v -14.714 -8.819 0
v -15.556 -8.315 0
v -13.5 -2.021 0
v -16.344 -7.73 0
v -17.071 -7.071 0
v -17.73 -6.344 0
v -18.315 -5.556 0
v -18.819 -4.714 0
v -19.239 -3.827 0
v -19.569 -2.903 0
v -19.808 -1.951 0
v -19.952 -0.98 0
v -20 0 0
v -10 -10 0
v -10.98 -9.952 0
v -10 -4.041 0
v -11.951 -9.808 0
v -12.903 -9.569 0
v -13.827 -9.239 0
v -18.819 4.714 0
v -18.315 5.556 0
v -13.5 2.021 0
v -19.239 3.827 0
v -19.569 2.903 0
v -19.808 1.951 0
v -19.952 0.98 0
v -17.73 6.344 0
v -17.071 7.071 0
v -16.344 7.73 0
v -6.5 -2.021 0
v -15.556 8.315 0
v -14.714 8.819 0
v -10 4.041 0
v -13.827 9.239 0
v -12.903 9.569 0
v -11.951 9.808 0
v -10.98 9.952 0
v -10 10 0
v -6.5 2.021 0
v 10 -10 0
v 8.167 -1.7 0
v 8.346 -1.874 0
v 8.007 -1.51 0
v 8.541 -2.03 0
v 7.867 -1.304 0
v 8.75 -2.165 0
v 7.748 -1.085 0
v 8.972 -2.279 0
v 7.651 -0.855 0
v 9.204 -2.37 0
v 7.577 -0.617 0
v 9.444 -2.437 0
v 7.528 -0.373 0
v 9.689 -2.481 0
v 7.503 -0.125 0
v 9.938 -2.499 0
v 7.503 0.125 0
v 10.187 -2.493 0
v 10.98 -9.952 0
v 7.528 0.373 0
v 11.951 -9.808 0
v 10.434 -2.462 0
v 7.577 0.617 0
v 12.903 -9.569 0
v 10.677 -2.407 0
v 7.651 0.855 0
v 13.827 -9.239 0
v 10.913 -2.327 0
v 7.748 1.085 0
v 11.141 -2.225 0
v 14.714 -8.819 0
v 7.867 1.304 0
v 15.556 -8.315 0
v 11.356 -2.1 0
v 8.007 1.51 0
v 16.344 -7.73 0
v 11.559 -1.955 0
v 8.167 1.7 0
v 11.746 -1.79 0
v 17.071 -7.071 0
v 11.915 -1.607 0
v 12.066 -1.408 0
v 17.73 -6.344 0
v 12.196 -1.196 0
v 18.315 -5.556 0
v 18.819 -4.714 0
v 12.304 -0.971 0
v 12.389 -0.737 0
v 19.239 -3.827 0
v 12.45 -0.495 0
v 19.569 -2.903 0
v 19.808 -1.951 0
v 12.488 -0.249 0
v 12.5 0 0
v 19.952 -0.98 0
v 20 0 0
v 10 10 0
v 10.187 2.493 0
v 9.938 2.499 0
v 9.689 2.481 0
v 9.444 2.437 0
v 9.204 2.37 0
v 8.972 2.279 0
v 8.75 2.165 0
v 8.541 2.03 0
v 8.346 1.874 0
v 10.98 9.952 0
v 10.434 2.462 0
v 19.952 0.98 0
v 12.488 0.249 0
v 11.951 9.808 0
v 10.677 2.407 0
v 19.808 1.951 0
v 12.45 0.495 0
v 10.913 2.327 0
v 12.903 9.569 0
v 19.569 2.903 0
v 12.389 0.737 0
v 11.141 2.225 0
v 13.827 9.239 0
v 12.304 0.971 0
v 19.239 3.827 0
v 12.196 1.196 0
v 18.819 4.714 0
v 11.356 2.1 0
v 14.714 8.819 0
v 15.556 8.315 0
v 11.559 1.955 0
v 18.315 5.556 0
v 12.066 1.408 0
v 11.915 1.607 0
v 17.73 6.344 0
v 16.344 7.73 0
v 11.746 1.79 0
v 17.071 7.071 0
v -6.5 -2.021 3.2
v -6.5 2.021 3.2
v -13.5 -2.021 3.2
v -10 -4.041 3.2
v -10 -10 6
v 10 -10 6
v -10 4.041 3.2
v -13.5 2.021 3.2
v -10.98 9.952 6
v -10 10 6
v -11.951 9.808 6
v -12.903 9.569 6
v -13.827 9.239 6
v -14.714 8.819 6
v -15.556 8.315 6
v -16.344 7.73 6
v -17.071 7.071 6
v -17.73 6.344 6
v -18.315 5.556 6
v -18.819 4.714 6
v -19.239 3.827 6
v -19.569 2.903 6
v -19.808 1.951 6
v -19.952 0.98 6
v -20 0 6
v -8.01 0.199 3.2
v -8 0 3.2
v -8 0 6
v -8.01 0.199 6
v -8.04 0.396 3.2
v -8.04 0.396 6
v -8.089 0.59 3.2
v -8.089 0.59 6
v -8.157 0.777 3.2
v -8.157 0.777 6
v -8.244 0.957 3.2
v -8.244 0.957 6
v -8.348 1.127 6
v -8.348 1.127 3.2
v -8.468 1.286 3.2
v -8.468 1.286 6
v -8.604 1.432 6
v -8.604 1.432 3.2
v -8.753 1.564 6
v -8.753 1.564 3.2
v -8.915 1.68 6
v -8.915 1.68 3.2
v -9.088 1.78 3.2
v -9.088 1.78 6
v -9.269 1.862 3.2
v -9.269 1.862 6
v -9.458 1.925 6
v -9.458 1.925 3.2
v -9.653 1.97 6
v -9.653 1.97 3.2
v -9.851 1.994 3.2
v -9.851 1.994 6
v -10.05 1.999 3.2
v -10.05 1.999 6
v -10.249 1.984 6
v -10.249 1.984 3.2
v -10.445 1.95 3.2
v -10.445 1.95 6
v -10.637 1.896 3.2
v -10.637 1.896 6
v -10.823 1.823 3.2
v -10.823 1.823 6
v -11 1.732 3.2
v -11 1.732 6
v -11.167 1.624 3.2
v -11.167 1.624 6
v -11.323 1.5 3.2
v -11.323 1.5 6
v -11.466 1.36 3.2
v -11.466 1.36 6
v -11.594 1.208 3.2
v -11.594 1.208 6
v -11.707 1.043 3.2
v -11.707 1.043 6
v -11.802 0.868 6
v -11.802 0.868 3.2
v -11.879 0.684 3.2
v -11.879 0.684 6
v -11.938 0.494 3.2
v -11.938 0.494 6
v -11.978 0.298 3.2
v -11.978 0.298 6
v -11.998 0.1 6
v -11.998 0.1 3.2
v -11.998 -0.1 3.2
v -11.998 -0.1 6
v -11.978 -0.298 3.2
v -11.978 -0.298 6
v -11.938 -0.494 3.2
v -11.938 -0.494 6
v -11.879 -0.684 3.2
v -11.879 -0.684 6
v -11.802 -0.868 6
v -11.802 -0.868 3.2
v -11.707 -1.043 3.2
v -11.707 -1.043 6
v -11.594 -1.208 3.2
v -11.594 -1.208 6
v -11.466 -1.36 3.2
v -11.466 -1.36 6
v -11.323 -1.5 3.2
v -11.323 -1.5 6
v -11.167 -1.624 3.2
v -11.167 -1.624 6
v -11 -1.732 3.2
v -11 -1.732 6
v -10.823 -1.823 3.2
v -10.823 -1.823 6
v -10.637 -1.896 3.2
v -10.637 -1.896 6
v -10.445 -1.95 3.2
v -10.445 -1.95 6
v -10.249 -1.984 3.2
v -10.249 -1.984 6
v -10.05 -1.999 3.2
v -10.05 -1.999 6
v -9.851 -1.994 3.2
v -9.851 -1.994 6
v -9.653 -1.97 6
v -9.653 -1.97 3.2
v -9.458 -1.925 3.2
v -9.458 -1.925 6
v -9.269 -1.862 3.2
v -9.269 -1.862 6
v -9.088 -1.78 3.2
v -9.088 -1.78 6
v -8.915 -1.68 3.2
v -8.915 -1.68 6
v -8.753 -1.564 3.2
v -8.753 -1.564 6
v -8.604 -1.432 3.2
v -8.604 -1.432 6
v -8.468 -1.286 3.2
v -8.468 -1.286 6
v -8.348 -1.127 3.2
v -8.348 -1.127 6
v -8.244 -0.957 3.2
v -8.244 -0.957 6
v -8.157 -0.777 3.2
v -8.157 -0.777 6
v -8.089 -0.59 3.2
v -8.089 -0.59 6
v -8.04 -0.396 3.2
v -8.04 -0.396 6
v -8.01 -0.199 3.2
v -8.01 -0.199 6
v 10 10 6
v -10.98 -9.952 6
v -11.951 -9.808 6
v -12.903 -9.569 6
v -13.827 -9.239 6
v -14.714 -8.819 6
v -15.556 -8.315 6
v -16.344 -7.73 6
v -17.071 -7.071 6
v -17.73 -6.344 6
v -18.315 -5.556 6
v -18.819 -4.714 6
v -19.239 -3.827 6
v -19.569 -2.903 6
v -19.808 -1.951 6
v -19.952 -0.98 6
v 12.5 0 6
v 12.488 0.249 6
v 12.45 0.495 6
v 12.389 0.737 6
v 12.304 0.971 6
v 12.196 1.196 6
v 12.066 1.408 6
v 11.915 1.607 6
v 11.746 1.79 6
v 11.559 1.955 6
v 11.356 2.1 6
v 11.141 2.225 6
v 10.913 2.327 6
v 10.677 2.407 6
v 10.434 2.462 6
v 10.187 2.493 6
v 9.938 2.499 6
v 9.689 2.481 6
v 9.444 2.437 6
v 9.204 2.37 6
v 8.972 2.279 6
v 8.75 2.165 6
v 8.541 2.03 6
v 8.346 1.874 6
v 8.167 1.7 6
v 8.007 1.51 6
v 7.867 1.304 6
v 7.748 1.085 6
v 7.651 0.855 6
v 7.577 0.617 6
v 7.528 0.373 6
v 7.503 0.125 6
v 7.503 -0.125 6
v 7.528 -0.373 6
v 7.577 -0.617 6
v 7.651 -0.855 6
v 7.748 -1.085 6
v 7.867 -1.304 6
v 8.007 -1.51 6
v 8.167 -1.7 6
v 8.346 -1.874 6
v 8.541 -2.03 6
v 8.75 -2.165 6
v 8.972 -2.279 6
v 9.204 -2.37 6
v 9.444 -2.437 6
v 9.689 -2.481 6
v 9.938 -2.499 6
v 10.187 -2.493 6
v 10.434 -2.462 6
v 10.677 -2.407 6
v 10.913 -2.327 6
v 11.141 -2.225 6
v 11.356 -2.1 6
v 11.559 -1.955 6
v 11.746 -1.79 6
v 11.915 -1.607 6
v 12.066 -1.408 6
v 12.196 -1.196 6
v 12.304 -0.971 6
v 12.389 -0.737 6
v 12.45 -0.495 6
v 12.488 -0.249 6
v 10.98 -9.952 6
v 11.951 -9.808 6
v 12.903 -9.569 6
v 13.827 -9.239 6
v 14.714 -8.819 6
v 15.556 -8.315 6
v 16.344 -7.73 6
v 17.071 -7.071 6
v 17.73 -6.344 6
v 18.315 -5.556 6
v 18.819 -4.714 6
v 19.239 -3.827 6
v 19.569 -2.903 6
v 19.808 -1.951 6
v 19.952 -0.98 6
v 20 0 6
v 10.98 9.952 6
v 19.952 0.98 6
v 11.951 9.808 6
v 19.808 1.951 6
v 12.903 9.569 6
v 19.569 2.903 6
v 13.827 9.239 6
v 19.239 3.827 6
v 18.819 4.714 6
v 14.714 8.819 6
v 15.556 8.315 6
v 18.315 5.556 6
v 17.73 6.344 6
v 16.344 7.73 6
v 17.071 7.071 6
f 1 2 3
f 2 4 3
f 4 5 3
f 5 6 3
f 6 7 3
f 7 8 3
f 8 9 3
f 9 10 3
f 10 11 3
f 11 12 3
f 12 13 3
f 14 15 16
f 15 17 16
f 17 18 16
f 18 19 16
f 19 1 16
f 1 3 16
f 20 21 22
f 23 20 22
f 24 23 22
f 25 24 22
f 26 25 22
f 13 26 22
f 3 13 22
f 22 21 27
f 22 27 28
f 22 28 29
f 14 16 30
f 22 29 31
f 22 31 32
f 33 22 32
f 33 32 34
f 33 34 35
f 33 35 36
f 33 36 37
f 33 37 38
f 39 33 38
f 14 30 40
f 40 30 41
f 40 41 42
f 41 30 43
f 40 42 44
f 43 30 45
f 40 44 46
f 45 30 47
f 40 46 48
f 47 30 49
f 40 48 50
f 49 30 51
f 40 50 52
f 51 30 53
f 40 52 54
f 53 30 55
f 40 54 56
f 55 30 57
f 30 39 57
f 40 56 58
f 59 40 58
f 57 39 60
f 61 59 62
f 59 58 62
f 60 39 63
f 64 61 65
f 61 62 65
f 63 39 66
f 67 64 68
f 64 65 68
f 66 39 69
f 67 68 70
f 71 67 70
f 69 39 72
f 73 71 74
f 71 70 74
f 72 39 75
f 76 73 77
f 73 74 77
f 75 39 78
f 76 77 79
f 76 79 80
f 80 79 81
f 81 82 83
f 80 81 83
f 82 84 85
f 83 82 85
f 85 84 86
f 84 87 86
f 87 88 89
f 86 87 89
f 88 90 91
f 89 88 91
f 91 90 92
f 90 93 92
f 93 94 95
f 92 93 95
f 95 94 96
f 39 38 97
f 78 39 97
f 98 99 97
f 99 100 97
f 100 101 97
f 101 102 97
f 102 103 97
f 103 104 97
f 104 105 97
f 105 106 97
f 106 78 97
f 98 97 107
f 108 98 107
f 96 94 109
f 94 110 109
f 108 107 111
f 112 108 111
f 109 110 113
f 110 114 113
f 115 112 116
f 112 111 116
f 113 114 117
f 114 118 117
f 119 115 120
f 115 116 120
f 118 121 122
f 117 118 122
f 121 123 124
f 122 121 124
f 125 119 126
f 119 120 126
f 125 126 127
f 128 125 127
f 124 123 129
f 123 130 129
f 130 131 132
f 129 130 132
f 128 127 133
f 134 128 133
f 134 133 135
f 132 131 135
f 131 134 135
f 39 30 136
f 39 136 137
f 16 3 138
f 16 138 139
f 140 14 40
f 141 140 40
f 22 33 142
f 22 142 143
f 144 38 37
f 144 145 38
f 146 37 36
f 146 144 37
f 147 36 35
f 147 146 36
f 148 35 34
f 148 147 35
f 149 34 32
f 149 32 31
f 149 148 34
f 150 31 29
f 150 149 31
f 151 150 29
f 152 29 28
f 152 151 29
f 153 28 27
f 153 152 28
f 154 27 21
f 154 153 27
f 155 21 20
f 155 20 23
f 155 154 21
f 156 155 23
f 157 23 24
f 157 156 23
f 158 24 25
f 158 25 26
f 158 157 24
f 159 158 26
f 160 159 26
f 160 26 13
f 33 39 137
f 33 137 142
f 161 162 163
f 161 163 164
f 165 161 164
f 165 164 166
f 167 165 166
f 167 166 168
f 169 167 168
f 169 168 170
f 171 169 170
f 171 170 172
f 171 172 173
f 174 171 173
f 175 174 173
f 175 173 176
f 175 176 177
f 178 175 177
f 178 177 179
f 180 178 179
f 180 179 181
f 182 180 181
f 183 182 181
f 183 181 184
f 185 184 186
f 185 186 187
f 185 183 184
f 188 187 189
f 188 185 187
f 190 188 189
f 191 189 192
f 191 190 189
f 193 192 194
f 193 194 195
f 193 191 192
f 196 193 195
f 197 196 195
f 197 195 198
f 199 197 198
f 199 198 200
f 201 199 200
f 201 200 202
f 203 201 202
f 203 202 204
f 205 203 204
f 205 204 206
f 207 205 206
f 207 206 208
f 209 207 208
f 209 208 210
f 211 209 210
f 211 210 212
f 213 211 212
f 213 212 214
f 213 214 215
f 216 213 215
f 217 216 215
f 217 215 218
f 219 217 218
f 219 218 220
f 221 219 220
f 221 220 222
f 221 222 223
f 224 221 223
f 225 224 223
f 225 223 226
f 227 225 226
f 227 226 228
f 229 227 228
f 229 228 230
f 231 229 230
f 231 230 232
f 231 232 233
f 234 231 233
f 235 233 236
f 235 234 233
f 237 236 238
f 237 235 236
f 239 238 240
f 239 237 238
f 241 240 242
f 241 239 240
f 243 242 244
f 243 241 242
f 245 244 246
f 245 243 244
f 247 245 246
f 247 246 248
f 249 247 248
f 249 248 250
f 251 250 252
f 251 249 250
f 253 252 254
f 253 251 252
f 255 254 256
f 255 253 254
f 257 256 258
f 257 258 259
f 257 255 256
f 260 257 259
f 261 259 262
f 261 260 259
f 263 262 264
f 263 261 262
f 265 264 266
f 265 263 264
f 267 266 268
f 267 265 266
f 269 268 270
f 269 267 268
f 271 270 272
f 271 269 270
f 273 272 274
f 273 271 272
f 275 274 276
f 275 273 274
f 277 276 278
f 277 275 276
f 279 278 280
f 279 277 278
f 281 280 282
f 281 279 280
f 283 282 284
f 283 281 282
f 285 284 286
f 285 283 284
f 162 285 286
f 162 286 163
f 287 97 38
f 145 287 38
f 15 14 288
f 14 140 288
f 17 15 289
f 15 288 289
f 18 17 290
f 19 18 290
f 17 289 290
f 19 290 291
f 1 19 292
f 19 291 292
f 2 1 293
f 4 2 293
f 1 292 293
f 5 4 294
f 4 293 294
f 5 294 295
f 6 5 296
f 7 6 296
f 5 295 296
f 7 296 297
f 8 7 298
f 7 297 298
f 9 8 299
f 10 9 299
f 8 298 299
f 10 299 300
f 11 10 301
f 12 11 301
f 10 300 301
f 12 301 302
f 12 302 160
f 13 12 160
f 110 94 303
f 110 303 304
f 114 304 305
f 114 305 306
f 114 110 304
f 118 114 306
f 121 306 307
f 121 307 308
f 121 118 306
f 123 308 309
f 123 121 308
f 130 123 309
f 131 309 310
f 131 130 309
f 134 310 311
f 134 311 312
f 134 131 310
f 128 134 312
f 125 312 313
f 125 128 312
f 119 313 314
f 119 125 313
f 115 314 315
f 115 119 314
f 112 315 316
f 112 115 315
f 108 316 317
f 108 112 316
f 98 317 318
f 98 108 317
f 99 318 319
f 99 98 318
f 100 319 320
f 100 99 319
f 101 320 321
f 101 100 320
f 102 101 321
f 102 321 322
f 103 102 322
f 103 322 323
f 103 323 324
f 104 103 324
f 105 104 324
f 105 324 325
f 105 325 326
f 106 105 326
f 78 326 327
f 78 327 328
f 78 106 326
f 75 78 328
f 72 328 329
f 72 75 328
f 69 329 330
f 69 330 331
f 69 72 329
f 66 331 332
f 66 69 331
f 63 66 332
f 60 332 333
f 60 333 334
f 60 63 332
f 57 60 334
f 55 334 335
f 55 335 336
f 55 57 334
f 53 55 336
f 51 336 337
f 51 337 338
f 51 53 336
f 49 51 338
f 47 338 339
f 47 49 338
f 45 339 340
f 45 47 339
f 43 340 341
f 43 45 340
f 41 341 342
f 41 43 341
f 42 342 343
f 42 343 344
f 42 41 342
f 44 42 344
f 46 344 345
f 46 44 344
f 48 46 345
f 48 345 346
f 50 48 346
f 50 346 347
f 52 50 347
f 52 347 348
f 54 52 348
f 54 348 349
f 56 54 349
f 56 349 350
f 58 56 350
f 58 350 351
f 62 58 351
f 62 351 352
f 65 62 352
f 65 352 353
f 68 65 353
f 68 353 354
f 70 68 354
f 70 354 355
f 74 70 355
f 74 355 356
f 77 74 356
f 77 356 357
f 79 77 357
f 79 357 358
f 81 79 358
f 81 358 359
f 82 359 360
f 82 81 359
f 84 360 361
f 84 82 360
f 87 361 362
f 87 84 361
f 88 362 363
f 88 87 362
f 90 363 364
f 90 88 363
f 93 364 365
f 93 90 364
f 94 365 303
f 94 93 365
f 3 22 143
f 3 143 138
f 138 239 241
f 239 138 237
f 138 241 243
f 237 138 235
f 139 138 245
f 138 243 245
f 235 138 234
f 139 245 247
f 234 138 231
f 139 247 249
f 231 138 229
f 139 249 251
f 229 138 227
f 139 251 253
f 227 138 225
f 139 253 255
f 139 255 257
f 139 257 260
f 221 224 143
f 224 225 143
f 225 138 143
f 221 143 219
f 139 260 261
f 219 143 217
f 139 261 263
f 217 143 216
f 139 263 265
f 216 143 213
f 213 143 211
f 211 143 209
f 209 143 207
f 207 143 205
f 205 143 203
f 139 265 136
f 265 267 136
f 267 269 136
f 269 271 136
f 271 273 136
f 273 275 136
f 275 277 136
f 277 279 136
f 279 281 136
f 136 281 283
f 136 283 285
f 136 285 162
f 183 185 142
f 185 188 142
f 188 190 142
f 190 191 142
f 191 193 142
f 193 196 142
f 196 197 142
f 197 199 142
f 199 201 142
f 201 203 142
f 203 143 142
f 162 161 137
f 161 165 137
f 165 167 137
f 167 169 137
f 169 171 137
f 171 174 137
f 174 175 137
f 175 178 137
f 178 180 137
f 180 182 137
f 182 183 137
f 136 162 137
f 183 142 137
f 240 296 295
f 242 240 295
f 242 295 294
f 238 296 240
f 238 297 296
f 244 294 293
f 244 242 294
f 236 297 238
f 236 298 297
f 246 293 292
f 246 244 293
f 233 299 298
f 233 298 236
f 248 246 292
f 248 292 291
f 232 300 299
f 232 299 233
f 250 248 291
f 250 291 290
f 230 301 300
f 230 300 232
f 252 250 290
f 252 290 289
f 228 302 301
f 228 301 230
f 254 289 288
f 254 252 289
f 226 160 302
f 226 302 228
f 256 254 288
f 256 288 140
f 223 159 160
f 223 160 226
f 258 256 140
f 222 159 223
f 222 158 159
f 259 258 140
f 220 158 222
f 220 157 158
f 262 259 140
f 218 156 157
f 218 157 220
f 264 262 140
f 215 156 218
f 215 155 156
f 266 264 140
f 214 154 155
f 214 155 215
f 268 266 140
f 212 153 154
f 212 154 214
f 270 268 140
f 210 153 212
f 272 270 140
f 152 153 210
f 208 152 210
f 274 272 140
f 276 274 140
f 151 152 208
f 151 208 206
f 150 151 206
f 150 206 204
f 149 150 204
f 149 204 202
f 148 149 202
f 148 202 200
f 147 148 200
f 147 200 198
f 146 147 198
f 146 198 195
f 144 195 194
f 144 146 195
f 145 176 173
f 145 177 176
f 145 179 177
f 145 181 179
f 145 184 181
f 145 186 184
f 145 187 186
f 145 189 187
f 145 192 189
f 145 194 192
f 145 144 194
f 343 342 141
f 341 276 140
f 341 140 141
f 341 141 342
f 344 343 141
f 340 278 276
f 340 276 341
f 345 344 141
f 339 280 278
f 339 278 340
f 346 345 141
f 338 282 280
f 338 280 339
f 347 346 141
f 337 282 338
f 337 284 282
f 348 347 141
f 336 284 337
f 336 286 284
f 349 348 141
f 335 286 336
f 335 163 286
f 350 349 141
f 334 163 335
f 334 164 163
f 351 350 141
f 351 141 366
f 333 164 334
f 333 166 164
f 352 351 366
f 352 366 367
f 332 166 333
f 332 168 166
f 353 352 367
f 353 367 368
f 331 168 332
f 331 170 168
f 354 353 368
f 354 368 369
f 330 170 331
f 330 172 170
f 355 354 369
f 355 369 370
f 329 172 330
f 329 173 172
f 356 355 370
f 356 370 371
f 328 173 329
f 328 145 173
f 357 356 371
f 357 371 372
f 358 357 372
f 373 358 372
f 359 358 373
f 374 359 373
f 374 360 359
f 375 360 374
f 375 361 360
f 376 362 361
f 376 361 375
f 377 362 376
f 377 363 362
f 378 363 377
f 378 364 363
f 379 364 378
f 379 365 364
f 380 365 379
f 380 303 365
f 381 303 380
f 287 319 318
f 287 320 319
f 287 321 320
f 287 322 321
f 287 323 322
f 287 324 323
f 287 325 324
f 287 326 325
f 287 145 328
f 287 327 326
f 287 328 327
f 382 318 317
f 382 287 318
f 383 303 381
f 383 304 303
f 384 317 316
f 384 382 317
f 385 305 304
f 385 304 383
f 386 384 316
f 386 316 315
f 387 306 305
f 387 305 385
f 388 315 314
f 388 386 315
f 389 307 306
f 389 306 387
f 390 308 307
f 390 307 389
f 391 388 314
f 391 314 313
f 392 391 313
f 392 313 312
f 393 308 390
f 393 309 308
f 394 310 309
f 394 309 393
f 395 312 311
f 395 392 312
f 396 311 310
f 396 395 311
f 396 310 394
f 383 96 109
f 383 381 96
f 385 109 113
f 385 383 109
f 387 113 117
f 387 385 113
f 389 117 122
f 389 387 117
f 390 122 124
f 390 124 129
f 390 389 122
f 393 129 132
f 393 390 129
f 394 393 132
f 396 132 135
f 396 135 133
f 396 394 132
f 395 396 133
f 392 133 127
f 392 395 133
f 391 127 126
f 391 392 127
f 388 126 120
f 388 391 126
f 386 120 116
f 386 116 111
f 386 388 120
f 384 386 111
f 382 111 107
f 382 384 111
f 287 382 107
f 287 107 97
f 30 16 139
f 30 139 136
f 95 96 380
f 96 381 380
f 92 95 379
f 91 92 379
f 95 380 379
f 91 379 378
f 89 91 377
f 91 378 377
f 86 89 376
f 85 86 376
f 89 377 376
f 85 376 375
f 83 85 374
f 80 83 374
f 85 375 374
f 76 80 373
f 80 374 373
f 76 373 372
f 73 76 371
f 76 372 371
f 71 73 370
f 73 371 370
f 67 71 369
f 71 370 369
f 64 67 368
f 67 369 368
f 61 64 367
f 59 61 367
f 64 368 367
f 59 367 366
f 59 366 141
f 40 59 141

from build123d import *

# Parameters (mm, degrees)
F0_R     = 2.5
F0_R_2   = 2
F1_DEPTH = 6
F2_DEPTH = 3.2
F3_R     = 9.99999


# Not quite as in the source:
# - a fillet or chamfer is up to 0.001 mm smaller than in the source, because OpenCascade refuses the exact size


with BuildPart() as f1:
    # F0 (on Top) → F1 (new body)
    with BuildSketch(Plane.XY):
        Polygon((20, -10), (20, 10), (0, 10), (-20, 10), (-20, -10), (0, -10), align=None)
        Polygon((-10, 4.0414518843), (-6.5, 2.0207259422), (-6.5, -2.0207259422), (-10, -4.0414518843), (-13.5, -2.0207259422), (-13.5, 2.0207259422), align=None, mode=Mode.SUBTRACT)
        with Locations((10, 0)):
            Circle(F0_R, mode=Mode.SUBTRACT)
        Polygon((-6.5, -2.0207259422), (-6.5, 2.0207259422), (-10, 4.0414518843), (-13.5, 2.0207259422), (-13.5, -2.0207259422), (-10, -4.0414518843), align=None)
        with Locations((-10, 0)):
            Circle(F0_R_2, mode=Mode.SUBTRACT)
    extrude(amount=F1_DEPTH)

    # F0 (on Top) → F2 (cut)
    with BuildSketch(Plane.XY):
        Polygon((-6.5, -2.0207259422), (-6.5, 2.0207259422), (-10, 4.0414518843), (-13.5, 2.0207259422), (-13.5, -2.0207259422), (-10, -4.0414518843), align=None)
        with Locations((-10, 0)):
            Circle(F0_R_2, mode=Mode.SUBTRACT)
    extrude(amount=F2_DEPTH, mode=Mode.SUBTRACT)

    # F3 (radius 10 in the source; OpenCascade refuses exactly that, so slightly less here)
    f3_edges = [f1.edges().sort_by_distance(p)[0] for p in [
        (-20, -10, 3),
        (20, -10, 3),
        (20, 10, 3),
        (-20, 10, 3),
    ]]
    fillet(f3_edges, radius=F3_R)


solid = f1.part
